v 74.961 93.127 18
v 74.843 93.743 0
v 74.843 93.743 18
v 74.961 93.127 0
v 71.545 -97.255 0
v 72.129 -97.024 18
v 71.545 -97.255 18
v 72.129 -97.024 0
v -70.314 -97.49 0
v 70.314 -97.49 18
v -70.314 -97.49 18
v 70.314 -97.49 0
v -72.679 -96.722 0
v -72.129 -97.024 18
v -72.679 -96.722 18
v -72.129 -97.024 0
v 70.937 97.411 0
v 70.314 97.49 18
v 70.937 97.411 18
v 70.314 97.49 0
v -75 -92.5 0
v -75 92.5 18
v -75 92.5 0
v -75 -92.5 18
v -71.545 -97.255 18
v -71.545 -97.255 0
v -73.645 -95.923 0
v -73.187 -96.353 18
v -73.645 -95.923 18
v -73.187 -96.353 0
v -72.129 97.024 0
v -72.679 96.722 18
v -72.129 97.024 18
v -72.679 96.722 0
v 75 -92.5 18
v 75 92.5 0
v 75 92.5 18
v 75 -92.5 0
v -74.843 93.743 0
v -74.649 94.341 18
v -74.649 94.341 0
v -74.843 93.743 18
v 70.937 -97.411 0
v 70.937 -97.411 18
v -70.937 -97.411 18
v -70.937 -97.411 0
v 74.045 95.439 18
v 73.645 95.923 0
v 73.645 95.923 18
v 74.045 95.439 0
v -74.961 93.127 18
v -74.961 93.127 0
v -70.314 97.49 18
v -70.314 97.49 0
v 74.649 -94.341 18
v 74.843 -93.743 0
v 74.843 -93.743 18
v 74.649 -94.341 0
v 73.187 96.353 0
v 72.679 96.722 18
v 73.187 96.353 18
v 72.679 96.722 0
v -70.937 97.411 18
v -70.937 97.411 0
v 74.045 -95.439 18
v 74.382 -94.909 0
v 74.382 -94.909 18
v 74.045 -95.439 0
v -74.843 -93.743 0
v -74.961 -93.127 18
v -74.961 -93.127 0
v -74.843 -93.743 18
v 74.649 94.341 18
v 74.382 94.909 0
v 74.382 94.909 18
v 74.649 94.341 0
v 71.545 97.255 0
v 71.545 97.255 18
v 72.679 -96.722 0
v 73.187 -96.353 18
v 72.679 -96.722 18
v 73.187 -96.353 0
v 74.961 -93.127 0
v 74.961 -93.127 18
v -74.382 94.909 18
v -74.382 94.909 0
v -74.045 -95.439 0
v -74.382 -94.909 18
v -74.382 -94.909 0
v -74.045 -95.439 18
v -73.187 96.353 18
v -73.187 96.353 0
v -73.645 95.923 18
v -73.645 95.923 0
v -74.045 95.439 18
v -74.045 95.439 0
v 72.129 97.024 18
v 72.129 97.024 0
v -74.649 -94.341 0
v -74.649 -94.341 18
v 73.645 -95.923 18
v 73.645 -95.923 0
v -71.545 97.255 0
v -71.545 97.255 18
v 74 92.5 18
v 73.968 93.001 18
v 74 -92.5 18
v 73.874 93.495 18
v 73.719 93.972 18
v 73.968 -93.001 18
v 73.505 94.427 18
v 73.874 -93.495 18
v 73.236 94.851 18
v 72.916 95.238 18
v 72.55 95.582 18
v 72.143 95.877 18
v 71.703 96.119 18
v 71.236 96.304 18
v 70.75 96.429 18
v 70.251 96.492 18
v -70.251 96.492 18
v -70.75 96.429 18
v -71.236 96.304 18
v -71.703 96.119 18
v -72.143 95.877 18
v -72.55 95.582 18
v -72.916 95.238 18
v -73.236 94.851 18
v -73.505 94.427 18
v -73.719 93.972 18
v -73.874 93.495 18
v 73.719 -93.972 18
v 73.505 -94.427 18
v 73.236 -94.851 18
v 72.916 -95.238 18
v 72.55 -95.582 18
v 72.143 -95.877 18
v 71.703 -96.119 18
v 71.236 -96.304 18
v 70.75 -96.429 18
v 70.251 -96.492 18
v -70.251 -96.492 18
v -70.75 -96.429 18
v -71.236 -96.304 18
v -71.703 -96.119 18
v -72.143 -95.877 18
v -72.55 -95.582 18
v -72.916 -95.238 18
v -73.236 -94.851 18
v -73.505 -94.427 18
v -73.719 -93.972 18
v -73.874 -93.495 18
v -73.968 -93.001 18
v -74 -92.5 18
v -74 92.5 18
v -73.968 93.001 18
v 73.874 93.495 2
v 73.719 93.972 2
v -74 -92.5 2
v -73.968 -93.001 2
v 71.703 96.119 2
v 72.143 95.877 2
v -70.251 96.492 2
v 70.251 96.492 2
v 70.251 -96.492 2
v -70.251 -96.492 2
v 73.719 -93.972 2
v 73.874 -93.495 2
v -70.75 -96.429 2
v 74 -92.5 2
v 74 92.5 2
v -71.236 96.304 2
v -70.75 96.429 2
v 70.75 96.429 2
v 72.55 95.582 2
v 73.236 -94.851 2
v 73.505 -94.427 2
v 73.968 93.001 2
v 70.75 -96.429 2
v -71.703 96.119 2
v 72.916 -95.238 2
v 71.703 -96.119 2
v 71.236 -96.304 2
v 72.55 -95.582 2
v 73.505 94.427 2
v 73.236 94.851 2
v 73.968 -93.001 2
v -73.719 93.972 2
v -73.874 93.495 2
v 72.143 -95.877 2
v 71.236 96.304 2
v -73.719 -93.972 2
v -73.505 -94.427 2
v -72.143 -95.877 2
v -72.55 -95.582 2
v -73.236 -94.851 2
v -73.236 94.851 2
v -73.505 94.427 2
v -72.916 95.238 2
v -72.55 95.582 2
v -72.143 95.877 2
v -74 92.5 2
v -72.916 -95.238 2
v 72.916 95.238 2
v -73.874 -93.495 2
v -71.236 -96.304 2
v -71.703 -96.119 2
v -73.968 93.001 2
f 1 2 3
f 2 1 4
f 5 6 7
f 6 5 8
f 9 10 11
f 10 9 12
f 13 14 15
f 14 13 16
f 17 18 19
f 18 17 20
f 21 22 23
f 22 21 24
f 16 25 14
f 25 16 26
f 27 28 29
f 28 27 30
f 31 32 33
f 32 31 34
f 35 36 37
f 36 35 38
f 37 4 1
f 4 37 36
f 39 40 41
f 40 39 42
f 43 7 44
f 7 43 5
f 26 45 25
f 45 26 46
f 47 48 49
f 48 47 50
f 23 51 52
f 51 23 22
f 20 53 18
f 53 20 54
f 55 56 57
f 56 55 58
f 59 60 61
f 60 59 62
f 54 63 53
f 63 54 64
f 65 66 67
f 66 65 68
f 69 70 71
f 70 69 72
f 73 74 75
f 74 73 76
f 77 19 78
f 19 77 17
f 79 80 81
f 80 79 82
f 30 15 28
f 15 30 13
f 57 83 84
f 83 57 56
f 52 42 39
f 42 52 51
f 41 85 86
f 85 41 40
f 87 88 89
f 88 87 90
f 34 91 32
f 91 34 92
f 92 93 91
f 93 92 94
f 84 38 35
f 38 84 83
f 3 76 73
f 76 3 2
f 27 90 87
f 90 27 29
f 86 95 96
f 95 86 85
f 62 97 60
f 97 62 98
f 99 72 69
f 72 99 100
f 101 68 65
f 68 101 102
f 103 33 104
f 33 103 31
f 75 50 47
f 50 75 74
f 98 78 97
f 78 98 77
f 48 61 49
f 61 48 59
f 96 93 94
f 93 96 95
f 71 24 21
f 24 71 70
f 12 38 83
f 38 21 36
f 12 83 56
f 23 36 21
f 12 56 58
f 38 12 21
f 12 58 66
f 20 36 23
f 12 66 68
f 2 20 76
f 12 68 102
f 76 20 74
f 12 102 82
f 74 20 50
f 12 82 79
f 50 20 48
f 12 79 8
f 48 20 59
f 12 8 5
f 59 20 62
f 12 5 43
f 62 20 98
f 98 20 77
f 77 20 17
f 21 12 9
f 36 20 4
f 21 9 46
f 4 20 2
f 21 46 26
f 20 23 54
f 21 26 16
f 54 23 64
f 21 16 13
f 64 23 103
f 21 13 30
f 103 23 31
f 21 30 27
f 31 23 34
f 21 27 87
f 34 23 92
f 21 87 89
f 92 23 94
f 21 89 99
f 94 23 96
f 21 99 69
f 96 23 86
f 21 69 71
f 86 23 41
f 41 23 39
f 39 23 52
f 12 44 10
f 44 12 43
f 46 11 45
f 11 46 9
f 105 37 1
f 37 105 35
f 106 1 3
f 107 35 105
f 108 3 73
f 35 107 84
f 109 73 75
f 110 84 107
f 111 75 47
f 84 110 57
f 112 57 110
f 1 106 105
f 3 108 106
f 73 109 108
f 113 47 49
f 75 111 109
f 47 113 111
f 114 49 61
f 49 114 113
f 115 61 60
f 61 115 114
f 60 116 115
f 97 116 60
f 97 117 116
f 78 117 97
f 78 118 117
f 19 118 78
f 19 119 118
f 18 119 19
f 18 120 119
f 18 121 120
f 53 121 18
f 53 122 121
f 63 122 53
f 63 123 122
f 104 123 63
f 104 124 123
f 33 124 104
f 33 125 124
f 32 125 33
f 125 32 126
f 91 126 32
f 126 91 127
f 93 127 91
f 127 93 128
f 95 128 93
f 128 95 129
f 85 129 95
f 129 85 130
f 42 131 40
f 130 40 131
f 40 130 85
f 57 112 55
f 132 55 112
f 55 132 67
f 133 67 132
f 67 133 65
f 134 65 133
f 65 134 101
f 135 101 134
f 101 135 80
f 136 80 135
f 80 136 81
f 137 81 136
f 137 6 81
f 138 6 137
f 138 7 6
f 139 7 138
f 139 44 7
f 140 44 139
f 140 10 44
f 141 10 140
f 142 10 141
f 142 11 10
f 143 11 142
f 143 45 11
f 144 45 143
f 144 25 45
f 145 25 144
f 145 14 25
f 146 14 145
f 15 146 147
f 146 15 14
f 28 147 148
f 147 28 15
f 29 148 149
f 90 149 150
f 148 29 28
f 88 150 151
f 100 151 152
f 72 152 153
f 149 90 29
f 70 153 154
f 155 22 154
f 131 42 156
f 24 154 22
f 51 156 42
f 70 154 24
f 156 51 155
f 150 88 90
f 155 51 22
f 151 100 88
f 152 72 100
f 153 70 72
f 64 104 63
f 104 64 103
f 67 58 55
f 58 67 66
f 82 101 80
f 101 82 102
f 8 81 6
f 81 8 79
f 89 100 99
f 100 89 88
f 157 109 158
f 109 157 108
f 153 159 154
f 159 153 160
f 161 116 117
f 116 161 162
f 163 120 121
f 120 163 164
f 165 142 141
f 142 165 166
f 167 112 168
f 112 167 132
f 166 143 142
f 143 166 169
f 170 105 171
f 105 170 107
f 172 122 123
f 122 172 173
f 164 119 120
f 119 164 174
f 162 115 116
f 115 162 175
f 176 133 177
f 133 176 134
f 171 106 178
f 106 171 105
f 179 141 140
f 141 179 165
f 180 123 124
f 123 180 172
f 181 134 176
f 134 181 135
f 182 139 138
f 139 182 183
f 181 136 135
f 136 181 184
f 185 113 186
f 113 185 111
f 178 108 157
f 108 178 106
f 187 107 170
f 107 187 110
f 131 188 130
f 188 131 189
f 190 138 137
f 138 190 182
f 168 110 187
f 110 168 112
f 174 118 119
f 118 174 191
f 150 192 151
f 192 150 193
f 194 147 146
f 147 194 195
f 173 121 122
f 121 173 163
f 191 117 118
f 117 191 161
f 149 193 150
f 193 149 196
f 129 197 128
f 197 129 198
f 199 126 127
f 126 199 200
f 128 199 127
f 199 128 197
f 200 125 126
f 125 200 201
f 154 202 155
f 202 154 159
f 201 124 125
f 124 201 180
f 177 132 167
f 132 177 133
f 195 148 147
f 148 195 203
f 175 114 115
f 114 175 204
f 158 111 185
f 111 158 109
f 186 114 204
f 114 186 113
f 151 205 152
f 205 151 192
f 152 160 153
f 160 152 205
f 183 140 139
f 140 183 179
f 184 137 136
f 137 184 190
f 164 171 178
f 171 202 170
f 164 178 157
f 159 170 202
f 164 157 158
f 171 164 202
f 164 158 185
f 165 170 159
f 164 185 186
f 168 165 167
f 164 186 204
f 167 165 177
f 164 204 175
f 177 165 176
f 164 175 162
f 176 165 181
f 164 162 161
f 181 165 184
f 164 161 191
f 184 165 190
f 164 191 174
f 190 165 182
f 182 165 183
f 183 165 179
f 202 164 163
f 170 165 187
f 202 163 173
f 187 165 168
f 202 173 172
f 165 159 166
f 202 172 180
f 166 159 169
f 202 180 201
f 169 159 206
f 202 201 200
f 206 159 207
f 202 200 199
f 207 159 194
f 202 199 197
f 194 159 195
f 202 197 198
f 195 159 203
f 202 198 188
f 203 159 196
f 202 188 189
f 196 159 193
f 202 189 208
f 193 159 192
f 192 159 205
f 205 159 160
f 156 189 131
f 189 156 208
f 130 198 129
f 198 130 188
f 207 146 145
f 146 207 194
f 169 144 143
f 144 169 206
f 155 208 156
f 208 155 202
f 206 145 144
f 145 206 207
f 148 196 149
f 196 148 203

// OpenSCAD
$fn = 50;


difference() {
	union() {
		hull() {
			translate(v = [-70.0000000000, 92.5000000000, 0]) {
				cylinder(h = 18, r = 5);
			}
			translate(v = [70.0000000000, 92.5000000000, 0]) {
				cylinder(h = 18, r = 5);
			}
			translate(v = [-70.0000000000, -92.5000000000, 0]) {
				cylinder(h = 18, r = 5);
			}
			translate(v = [70.0000000000, -92.5000000000, 0]) {
				cylinder(h = 18, r = 5);
			}
		}
	}
	union() {
		translate(v = [0, 0, 2]) {
			hull() {
				translate(v = [-70.0000000000, 92.5000000000, 0]) {
					cylinder(h = 16, r = 4);
				}
				translate(v = [70.0000000000, 92.5000000000, 0]) {
					cylinder(h = 16, r = 4);
				}
				translate(v = [-70.0000000000, -92.5000000000, 0]) {
					cylinder(h = 16, r = 4);
				}
				translate(v = [70.0000000000, -92.5000000000, 0]) {
					cylinder(h = 16, r = 4);
				}
			}
		}
	}
}
